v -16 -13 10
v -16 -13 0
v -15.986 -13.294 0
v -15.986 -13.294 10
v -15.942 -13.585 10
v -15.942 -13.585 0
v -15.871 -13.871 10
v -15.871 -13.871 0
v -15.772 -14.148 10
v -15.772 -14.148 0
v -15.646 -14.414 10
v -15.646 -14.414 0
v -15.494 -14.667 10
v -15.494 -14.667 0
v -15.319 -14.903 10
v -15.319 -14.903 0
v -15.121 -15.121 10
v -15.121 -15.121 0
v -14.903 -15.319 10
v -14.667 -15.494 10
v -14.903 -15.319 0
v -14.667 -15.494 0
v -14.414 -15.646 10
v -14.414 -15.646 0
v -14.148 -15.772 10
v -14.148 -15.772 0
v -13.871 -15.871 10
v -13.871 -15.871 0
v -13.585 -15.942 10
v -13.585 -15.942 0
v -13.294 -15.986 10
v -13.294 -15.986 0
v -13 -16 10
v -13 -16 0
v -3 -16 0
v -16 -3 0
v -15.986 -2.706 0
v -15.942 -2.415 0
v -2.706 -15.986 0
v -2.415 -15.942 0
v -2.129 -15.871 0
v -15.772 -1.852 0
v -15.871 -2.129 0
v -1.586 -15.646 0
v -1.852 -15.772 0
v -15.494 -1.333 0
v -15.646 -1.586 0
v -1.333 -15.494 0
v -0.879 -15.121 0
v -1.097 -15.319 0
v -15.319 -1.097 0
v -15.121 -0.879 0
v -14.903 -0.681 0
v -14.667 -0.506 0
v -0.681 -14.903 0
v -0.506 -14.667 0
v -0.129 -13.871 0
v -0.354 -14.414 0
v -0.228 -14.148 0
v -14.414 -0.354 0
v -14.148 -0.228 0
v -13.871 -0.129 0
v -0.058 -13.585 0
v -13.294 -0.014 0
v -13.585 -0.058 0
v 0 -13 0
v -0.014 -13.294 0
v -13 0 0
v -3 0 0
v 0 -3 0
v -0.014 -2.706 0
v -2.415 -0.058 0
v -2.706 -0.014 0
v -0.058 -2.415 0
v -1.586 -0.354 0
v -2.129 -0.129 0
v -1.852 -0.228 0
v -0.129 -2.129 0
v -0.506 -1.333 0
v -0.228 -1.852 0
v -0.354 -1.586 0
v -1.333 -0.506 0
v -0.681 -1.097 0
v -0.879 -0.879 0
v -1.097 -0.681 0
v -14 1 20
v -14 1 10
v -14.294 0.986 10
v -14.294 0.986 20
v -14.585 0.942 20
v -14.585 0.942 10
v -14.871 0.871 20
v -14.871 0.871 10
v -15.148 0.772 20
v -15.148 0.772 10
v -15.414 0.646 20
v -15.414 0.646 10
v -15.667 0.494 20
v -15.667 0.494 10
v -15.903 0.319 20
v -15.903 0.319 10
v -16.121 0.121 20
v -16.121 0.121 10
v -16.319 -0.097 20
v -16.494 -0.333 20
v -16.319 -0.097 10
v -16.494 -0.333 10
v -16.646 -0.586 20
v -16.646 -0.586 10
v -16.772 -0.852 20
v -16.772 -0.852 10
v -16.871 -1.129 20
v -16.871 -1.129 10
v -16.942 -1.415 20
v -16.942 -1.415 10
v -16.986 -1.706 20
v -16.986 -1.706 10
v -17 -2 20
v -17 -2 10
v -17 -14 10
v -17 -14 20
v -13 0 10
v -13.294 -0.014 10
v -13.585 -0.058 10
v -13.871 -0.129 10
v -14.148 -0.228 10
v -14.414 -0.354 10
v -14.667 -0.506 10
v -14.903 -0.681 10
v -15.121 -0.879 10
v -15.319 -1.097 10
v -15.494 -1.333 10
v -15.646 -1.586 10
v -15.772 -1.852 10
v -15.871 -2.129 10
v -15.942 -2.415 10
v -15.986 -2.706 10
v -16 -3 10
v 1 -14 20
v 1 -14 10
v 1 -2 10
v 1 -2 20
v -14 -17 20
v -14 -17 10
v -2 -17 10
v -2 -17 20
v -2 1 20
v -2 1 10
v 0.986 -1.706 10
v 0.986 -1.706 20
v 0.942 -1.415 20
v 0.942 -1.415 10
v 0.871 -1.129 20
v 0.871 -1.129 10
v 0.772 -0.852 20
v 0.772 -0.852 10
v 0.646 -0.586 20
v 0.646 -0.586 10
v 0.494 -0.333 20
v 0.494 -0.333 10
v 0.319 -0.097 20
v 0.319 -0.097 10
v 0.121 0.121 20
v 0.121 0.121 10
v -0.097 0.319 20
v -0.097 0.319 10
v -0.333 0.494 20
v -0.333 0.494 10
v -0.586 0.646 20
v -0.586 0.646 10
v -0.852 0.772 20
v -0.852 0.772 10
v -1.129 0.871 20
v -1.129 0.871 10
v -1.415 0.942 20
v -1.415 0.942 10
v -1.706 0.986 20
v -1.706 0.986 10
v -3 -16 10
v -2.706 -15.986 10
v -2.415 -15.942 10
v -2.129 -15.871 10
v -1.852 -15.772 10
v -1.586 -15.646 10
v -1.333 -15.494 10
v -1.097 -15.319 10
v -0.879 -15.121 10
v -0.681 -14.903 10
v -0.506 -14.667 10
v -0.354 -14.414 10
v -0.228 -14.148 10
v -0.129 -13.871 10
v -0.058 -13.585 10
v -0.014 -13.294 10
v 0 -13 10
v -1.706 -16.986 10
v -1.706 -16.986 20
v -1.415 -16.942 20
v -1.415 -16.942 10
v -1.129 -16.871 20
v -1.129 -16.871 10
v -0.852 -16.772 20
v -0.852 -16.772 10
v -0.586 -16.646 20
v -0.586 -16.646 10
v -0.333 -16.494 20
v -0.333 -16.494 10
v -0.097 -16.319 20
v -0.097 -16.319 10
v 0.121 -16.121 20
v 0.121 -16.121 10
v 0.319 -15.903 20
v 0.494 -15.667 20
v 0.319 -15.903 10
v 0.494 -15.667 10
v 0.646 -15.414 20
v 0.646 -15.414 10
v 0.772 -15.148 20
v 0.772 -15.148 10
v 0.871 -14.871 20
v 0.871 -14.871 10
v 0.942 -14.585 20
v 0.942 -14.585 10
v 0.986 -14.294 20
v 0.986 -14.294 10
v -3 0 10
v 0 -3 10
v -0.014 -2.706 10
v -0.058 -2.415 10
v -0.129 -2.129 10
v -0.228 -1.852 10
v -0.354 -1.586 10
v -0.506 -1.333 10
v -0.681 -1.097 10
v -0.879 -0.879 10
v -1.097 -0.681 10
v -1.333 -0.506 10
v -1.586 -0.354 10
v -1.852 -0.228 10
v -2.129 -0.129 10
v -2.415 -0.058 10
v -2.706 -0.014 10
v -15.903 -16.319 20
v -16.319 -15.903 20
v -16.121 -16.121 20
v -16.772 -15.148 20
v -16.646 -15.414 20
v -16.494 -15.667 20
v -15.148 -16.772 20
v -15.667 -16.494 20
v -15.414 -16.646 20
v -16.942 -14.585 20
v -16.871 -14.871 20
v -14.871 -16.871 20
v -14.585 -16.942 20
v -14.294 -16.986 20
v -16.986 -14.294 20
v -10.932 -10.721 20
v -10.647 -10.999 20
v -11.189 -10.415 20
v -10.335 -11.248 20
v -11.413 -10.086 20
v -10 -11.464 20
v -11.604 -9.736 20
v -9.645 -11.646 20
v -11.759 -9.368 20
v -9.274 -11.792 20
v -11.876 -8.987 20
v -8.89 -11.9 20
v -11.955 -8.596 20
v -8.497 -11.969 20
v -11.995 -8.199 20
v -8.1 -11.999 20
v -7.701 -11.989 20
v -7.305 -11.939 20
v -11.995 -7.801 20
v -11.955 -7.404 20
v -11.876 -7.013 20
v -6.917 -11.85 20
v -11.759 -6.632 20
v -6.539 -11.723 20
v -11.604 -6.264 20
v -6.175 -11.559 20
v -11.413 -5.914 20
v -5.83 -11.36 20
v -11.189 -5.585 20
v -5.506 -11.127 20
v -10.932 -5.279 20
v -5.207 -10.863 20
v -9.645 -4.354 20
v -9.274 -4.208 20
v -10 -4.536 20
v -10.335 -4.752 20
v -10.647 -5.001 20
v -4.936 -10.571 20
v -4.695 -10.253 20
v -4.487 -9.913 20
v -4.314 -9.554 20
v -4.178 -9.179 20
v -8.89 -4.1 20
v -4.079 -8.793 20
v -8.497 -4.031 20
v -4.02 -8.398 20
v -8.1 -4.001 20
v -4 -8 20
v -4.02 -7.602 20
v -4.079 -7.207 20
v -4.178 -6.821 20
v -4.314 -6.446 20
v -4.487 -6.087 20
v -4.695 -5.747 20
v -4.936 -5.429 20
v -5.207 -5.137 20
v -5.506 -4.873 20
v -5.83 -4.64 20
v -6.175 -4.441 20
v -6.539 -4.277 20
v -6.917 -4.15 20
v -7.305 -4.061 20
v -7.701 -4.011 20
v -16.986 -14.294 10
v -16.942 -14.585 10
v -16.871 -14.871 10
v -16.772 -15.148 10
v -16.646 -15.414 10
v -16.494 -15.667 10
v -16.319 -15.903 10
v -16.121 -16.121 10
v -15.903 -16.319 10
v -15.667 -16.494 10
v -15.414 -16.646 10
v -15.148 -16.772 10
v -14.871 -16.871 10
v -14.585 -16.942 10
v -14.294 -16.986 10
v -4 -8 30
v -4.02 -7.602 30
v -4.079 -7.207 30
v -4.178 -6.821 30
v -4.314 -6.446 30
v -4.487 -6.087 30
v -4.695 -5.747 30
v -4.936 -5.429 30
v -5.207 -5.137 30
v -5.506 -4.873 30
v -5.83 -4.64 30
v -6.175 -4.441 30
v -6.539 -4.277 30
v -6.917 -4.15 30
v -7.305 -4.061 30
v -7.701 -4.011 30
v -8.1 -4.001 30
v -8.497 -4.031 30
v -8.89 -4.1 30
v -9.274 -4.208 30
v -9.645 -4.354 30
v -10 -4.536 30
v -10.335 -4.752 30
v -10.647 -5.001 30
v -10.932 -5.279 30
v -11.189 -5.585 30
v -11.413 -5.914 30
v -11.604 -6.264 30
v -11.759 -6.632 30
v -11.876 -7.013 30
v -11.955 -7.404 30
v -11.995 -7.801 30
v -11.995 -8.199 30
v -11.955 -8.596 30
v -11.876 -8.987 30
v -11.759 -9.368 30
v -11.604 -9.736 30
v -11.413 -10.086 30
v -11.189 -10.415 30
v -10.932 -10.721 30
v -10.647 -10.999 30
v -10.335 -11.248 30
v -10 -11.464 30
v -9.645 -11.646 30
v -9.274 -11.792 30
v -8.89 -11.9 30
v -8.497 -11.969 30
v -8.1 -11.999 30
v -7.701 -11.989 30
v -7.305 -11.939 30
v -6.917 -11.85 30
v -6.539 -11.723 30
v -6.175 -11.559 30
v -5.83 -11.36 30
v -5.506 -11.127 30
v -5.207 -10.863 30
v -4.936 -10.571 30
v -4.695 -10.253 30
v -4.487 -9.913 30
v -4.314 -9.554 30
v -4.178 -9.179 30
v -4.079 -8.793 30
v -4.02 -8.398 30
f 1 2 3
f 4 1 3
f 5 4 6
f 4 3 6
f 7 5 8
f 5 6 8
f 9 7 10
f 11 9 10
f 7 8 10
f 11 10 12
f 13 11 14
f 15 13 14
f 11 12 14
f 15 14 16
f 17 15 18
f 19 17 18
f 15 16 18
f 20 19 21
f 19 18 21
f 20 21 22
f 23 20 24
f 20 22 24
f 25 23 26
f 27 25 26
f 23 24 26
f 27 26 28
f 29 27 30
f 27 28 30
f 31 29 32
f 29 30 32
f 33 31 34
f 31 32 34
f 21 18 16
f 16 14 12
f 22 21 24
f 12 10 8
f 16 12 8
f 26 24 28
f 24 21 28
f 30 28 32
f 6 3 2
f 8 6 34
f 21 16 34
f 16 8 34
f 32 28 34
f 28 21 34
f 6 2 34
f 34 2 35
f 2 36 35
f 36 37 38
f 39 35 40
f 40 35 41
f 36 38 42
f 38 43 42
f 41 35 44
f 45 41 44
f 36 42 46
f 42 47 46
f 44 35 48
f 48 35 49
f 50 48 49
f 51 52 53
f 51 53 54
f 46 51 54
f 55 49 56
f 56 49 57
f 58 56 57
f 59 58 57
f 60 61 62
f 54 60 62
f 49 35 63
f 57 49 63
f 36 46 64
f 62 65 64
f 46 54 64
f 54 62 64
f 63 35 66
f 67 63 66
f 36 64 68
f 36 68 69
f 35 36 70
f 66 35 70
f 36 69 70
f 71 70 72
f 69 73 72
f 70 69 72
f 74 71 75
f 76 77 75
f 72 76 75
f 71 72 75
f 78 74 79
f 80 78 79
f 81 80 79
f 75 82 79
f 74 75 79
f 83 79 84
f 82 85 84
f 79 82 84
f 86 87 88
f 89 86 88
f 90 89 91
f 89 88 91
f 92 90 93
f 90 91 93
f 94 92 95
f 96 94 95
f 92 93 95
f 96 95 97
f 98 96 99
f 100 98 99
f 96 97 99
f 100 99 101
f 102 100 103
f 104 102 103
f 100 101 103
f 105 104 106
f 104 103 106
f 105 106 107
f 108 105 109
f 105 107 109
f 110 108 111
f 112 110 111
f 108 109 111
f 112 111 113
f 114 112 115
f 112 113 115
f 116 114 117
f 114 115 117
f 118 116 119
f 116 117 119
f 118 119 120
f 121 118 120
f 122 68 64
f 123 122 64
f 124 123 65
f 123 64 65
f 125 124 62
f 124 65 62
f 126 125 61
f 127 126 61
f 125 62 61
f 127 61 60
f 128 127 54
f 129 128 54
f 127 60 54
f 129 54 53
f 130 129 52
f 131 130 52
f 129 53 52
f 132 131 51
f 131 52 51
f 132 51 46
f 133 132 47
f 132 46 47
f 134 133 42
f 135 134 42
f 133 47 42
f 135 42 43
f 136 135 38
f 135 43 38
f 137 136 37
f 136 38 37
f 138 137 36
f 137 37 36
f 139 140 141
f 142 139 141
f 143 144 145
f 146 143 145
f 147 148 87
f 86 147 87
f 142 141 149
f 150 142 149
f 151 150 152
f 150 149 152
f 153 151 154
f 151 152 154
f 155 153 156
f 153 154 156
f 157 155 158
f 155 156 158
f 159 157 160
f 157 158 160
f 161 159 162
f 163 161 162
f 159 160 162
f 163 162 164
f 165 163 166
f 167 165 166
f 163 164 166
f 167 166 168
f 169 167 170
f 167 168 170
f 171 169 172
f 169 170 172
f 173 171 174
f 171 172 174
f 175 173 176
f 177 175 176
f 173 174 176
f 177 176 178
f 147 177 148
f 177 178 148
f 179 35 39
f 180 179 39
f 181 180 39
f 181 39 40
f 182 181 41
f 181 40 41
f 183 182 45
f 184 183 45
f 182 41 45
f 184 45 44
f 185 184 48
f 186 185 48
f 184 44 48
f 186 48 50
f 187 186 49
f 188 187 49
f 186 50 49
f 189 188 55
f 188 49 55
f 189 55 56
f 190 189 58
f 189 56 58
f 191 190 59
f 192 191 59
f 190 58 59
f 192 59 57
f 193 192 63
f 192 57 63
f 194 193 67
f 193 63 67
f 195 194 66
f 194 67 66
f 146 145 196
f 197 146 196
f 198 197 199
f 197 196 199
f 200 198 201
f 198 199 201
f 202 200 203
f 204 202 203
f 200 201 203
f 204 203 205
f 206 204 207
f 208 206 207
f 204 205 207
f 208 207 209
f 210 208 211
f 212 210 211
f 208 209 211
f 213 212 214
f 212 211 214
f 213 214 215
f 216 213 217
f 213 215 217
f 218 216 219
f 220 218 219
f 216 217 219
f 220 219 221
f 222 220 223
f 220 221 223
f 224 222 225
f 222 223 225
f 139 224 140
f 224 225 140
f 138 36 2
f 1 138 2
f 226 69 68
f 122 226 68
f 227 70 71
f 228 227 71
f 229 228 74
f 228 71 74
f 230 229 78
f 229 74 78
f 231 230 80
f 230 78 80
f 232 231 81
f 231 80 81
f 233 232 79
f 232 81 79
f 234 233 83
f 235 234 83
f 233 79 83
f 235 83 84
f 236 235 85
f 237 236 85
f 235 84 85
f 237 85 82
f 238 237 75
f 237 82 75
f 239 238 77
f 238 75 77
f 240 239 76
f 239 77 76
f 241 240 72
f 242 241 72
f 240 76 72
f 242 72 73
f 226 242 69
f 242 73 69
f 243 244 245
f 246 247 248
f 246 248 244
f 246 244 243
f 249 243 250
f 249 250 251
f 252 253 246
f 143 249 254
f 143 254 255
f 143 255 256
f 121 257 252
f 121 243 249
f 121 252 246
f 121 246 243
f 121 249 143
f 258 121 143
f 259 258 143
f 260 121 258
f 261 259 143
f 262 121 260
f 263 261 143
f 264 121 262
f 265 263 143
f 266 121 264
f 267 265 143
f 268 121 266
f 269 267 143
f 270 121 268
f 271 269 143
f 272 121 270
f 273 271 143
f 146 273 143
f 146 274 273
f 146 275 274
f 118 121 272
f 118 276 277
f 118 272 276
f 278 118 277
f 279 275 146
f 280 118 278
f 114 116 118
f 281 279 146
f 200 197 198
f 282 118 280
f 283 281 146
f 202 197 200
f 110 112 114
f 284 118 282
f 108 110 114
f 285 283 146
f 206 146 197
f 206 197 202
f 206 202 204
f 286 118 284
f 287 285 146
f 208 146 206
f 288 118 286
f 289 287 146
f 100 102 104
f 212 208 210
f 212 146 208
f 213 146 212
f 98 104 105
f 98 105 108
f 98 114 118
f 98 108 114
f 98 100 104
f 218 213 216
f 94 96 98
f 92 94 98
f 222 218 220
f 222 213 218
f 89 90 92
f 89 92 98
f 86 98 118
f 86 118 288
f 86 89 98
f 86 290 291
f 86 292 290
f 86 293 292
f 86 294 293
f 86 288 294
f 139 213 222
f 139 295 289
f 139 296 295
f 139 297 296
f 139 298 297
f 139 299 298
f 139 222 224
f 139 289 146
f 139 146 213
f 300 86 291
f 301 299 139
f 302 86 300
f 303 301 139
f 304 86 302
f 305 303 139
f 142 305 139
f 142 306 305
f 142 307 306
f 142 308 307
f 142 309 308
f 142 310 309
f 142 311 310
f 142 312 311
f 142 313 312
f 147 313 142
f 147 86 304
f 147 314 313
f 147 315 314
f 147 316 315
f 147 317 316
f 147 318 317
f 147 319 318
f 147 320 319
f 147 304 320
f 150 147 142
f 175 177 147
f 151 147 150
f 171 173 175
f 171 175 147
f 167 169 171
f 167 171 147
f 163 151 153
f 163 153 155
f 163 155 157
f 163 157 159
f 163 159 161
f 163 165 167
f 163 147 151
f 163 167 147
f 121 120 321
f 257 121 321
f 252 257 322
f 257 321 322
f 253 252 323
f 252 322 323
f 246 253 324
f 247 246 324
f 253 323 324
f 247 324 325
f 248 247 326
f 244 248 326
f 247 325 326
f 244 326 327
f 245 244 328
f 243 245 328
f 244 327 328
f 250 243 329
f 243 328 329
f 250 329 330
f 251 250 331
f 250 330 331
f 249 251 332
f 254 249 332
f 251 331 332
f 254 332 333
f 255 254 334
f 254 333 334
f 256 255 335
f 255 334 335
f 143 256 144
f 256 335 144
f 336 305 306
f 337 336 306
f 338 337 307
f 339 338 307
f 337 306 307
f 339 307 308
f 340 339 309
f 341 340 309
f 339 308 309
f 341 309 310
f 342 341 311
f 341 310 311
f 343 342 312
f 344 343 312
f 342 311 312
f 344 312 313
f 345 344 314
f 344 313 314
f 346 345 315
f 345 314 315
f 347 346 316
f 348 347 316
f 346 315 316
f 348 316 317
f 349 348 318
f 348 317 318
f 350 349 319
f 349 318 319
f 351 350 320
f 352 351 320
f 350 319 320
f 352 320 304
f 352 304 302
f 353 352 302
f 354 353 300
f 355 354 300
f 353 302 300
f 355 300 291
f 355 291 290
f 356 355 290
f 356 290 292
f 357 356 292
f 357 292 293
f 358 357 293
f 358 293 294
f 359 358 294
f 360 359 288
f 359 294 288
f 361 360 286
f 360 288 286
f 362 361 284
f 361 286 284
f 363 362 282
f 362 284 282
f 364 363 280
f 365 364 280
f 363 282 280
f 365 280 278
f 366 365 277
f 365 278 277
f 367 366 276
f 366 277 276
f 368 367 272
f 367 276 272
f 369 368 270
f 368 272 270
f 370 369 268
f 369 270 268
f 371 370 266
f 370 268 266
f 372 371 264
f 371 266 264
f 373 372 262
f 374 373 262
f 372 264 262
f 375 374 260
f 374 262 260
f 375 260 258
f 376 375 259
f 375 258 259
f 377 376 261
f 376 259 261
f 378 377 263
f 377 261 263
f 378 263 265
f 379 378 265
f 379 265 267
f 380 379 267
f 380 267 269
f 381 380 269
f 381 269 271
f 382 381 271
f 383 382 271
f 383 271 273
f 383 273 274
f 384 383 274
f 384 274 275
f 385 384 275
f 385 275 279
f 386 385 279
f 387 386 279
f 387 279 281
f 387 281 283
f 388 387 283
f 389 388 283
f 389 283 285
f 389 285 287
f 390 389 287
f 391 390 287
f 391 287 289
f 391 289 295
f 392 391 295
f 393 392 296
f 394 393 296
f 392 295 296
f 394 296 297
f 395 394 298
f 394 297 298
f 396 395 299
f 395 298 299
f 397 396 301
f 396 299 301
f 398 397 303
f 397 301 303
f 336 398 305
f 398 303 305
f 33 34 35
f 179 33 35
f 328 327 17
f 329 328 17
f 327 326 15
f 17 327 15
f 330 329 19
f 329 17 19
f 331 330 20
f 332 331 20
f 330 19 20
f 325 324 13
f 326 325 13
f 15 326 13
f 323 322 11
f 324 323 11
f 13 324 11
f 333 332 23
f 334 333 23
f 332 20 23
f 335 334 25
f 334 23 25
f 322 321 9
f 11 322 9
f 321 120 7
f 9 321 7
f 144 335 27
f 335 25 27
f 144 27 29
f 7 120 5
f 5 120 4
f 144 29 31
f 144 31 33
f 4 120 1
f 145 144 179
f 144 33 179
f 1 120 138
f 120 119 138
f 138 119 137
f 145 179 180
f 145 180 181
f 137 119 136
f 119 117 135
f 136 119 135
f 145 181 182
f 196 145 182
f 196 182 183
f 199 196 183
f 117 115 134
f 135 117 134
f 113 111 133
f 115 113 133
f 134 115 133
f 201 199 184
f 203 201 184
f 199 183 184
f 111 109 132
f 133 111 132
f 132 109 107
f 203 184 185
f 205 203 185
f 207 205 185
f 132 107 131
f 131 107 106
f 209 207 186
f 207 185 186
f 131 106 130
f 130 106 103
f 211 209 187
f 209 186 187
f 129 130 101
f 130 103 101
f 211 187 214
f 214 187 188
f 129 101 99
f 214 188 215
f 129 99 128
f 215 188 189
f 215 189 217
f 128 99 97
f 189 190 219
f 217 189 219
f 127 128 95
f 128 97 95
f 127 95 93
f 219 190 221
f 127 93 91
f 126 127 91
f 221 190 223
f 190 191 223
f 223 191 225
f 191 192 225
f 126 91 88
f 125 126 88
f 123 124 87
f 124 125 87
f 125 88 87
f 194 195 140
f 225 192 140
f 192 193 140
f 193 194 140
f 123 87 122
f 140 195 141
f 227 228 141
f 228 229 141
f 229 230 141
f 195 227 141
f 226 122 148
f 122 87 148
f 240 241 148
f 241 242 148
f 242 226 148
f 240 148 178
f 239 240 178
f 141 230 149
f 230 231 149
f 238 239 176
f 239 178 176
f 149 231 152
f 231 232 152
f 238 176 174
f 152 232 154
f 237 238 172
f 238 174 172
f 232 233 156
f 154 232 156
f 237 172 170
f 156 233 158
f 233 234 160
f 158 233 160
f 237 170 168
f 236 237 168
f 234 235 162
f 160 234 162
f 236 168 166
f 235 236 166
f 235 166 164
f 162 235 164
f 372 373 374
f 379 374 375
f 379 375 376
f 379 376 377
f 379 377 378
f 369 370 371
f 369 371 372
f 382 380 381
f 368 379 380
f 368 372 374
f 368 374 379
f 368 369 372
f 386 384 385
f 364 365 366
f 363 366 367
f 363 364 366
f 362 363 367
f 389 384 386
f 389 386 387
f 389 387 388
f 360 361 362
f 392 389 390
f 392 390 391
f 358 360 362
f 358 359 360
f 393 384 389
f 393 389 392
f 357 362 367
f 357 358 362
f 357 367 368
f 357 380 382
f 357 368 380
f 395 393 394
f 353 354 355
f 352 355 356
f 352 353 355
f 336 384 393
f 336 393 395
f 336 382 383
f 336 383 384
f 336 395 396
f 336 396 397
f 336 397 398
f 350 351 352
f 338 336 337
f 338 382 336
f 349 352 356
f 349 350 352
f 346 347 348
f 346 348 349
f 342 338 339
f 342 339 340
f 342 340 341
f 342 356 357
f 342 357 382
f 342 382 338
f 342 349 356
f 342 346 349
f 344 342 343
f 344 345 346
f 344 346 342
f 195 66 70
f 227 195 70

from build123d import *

# Parameters (mm, degrees)
F1_DEPTH = 10
F3_DEPTH = 10
F4_R     = 4
F5_DEPTH = 10


with BuildPart() as f1:
    # F0 (on Top) → F1 (new body)
    with BuildSketch(Plane.XY):
        with BuildLine():
            ThreePointArc((0, -3), (-0.87868, -0.87868), (-3, 0))
            Line((-3, 0), (-13, 0))
            ThreePointArc((-13, 0), (-15.12132, -0.87868), (-16, -3))
            Line((-16, -3), (-16, -13))
            ThreePointArc((-16, -13), (-15.12132, -15.12132), (-13, -16))
            Line((-13, -16), (-3, -16))
            ThreePointArc((-3, -16), (-0.87868, -15.12132), (0, -13))
            Line((0, -13), (0, -3))
        make_face()
    extrude(amount=F1_DEPTH)

    # F2 (on face) → F3 (join)
    with BuildSketch(Plane.XY.offset(10)):
        with BuildLine():
            Line((-2, 1), (-14, 1))
            ThreePointArc((-14, 1), (-16.12132, 0.12132), (-17, -2))
            Line((-17, -2), (-17, -14))
            ThreePointArc((-17, -14), (-16.12132, -16.12132), (-14, -17))
            Line((-14, -17), (-2, -17))
            ThreePointArc((-2, -17), (0.12132, -16.12132), (1, -14))
            Line((1, -14), (1, -2))
            ThreePointArc((1, -2), (0.12132, 0.12132), (-2, 1))
        make_face()
    extrude(amount=F3_DEPTH)

    # F4 (on face) → F5 (join)
    with BuildSketch(Plane.XY.offset(20)):
        with Locations((-8, -8)):
            Circle(F4_R)
    extrude(amount=F5_DEPTH)


solid = f1.part
